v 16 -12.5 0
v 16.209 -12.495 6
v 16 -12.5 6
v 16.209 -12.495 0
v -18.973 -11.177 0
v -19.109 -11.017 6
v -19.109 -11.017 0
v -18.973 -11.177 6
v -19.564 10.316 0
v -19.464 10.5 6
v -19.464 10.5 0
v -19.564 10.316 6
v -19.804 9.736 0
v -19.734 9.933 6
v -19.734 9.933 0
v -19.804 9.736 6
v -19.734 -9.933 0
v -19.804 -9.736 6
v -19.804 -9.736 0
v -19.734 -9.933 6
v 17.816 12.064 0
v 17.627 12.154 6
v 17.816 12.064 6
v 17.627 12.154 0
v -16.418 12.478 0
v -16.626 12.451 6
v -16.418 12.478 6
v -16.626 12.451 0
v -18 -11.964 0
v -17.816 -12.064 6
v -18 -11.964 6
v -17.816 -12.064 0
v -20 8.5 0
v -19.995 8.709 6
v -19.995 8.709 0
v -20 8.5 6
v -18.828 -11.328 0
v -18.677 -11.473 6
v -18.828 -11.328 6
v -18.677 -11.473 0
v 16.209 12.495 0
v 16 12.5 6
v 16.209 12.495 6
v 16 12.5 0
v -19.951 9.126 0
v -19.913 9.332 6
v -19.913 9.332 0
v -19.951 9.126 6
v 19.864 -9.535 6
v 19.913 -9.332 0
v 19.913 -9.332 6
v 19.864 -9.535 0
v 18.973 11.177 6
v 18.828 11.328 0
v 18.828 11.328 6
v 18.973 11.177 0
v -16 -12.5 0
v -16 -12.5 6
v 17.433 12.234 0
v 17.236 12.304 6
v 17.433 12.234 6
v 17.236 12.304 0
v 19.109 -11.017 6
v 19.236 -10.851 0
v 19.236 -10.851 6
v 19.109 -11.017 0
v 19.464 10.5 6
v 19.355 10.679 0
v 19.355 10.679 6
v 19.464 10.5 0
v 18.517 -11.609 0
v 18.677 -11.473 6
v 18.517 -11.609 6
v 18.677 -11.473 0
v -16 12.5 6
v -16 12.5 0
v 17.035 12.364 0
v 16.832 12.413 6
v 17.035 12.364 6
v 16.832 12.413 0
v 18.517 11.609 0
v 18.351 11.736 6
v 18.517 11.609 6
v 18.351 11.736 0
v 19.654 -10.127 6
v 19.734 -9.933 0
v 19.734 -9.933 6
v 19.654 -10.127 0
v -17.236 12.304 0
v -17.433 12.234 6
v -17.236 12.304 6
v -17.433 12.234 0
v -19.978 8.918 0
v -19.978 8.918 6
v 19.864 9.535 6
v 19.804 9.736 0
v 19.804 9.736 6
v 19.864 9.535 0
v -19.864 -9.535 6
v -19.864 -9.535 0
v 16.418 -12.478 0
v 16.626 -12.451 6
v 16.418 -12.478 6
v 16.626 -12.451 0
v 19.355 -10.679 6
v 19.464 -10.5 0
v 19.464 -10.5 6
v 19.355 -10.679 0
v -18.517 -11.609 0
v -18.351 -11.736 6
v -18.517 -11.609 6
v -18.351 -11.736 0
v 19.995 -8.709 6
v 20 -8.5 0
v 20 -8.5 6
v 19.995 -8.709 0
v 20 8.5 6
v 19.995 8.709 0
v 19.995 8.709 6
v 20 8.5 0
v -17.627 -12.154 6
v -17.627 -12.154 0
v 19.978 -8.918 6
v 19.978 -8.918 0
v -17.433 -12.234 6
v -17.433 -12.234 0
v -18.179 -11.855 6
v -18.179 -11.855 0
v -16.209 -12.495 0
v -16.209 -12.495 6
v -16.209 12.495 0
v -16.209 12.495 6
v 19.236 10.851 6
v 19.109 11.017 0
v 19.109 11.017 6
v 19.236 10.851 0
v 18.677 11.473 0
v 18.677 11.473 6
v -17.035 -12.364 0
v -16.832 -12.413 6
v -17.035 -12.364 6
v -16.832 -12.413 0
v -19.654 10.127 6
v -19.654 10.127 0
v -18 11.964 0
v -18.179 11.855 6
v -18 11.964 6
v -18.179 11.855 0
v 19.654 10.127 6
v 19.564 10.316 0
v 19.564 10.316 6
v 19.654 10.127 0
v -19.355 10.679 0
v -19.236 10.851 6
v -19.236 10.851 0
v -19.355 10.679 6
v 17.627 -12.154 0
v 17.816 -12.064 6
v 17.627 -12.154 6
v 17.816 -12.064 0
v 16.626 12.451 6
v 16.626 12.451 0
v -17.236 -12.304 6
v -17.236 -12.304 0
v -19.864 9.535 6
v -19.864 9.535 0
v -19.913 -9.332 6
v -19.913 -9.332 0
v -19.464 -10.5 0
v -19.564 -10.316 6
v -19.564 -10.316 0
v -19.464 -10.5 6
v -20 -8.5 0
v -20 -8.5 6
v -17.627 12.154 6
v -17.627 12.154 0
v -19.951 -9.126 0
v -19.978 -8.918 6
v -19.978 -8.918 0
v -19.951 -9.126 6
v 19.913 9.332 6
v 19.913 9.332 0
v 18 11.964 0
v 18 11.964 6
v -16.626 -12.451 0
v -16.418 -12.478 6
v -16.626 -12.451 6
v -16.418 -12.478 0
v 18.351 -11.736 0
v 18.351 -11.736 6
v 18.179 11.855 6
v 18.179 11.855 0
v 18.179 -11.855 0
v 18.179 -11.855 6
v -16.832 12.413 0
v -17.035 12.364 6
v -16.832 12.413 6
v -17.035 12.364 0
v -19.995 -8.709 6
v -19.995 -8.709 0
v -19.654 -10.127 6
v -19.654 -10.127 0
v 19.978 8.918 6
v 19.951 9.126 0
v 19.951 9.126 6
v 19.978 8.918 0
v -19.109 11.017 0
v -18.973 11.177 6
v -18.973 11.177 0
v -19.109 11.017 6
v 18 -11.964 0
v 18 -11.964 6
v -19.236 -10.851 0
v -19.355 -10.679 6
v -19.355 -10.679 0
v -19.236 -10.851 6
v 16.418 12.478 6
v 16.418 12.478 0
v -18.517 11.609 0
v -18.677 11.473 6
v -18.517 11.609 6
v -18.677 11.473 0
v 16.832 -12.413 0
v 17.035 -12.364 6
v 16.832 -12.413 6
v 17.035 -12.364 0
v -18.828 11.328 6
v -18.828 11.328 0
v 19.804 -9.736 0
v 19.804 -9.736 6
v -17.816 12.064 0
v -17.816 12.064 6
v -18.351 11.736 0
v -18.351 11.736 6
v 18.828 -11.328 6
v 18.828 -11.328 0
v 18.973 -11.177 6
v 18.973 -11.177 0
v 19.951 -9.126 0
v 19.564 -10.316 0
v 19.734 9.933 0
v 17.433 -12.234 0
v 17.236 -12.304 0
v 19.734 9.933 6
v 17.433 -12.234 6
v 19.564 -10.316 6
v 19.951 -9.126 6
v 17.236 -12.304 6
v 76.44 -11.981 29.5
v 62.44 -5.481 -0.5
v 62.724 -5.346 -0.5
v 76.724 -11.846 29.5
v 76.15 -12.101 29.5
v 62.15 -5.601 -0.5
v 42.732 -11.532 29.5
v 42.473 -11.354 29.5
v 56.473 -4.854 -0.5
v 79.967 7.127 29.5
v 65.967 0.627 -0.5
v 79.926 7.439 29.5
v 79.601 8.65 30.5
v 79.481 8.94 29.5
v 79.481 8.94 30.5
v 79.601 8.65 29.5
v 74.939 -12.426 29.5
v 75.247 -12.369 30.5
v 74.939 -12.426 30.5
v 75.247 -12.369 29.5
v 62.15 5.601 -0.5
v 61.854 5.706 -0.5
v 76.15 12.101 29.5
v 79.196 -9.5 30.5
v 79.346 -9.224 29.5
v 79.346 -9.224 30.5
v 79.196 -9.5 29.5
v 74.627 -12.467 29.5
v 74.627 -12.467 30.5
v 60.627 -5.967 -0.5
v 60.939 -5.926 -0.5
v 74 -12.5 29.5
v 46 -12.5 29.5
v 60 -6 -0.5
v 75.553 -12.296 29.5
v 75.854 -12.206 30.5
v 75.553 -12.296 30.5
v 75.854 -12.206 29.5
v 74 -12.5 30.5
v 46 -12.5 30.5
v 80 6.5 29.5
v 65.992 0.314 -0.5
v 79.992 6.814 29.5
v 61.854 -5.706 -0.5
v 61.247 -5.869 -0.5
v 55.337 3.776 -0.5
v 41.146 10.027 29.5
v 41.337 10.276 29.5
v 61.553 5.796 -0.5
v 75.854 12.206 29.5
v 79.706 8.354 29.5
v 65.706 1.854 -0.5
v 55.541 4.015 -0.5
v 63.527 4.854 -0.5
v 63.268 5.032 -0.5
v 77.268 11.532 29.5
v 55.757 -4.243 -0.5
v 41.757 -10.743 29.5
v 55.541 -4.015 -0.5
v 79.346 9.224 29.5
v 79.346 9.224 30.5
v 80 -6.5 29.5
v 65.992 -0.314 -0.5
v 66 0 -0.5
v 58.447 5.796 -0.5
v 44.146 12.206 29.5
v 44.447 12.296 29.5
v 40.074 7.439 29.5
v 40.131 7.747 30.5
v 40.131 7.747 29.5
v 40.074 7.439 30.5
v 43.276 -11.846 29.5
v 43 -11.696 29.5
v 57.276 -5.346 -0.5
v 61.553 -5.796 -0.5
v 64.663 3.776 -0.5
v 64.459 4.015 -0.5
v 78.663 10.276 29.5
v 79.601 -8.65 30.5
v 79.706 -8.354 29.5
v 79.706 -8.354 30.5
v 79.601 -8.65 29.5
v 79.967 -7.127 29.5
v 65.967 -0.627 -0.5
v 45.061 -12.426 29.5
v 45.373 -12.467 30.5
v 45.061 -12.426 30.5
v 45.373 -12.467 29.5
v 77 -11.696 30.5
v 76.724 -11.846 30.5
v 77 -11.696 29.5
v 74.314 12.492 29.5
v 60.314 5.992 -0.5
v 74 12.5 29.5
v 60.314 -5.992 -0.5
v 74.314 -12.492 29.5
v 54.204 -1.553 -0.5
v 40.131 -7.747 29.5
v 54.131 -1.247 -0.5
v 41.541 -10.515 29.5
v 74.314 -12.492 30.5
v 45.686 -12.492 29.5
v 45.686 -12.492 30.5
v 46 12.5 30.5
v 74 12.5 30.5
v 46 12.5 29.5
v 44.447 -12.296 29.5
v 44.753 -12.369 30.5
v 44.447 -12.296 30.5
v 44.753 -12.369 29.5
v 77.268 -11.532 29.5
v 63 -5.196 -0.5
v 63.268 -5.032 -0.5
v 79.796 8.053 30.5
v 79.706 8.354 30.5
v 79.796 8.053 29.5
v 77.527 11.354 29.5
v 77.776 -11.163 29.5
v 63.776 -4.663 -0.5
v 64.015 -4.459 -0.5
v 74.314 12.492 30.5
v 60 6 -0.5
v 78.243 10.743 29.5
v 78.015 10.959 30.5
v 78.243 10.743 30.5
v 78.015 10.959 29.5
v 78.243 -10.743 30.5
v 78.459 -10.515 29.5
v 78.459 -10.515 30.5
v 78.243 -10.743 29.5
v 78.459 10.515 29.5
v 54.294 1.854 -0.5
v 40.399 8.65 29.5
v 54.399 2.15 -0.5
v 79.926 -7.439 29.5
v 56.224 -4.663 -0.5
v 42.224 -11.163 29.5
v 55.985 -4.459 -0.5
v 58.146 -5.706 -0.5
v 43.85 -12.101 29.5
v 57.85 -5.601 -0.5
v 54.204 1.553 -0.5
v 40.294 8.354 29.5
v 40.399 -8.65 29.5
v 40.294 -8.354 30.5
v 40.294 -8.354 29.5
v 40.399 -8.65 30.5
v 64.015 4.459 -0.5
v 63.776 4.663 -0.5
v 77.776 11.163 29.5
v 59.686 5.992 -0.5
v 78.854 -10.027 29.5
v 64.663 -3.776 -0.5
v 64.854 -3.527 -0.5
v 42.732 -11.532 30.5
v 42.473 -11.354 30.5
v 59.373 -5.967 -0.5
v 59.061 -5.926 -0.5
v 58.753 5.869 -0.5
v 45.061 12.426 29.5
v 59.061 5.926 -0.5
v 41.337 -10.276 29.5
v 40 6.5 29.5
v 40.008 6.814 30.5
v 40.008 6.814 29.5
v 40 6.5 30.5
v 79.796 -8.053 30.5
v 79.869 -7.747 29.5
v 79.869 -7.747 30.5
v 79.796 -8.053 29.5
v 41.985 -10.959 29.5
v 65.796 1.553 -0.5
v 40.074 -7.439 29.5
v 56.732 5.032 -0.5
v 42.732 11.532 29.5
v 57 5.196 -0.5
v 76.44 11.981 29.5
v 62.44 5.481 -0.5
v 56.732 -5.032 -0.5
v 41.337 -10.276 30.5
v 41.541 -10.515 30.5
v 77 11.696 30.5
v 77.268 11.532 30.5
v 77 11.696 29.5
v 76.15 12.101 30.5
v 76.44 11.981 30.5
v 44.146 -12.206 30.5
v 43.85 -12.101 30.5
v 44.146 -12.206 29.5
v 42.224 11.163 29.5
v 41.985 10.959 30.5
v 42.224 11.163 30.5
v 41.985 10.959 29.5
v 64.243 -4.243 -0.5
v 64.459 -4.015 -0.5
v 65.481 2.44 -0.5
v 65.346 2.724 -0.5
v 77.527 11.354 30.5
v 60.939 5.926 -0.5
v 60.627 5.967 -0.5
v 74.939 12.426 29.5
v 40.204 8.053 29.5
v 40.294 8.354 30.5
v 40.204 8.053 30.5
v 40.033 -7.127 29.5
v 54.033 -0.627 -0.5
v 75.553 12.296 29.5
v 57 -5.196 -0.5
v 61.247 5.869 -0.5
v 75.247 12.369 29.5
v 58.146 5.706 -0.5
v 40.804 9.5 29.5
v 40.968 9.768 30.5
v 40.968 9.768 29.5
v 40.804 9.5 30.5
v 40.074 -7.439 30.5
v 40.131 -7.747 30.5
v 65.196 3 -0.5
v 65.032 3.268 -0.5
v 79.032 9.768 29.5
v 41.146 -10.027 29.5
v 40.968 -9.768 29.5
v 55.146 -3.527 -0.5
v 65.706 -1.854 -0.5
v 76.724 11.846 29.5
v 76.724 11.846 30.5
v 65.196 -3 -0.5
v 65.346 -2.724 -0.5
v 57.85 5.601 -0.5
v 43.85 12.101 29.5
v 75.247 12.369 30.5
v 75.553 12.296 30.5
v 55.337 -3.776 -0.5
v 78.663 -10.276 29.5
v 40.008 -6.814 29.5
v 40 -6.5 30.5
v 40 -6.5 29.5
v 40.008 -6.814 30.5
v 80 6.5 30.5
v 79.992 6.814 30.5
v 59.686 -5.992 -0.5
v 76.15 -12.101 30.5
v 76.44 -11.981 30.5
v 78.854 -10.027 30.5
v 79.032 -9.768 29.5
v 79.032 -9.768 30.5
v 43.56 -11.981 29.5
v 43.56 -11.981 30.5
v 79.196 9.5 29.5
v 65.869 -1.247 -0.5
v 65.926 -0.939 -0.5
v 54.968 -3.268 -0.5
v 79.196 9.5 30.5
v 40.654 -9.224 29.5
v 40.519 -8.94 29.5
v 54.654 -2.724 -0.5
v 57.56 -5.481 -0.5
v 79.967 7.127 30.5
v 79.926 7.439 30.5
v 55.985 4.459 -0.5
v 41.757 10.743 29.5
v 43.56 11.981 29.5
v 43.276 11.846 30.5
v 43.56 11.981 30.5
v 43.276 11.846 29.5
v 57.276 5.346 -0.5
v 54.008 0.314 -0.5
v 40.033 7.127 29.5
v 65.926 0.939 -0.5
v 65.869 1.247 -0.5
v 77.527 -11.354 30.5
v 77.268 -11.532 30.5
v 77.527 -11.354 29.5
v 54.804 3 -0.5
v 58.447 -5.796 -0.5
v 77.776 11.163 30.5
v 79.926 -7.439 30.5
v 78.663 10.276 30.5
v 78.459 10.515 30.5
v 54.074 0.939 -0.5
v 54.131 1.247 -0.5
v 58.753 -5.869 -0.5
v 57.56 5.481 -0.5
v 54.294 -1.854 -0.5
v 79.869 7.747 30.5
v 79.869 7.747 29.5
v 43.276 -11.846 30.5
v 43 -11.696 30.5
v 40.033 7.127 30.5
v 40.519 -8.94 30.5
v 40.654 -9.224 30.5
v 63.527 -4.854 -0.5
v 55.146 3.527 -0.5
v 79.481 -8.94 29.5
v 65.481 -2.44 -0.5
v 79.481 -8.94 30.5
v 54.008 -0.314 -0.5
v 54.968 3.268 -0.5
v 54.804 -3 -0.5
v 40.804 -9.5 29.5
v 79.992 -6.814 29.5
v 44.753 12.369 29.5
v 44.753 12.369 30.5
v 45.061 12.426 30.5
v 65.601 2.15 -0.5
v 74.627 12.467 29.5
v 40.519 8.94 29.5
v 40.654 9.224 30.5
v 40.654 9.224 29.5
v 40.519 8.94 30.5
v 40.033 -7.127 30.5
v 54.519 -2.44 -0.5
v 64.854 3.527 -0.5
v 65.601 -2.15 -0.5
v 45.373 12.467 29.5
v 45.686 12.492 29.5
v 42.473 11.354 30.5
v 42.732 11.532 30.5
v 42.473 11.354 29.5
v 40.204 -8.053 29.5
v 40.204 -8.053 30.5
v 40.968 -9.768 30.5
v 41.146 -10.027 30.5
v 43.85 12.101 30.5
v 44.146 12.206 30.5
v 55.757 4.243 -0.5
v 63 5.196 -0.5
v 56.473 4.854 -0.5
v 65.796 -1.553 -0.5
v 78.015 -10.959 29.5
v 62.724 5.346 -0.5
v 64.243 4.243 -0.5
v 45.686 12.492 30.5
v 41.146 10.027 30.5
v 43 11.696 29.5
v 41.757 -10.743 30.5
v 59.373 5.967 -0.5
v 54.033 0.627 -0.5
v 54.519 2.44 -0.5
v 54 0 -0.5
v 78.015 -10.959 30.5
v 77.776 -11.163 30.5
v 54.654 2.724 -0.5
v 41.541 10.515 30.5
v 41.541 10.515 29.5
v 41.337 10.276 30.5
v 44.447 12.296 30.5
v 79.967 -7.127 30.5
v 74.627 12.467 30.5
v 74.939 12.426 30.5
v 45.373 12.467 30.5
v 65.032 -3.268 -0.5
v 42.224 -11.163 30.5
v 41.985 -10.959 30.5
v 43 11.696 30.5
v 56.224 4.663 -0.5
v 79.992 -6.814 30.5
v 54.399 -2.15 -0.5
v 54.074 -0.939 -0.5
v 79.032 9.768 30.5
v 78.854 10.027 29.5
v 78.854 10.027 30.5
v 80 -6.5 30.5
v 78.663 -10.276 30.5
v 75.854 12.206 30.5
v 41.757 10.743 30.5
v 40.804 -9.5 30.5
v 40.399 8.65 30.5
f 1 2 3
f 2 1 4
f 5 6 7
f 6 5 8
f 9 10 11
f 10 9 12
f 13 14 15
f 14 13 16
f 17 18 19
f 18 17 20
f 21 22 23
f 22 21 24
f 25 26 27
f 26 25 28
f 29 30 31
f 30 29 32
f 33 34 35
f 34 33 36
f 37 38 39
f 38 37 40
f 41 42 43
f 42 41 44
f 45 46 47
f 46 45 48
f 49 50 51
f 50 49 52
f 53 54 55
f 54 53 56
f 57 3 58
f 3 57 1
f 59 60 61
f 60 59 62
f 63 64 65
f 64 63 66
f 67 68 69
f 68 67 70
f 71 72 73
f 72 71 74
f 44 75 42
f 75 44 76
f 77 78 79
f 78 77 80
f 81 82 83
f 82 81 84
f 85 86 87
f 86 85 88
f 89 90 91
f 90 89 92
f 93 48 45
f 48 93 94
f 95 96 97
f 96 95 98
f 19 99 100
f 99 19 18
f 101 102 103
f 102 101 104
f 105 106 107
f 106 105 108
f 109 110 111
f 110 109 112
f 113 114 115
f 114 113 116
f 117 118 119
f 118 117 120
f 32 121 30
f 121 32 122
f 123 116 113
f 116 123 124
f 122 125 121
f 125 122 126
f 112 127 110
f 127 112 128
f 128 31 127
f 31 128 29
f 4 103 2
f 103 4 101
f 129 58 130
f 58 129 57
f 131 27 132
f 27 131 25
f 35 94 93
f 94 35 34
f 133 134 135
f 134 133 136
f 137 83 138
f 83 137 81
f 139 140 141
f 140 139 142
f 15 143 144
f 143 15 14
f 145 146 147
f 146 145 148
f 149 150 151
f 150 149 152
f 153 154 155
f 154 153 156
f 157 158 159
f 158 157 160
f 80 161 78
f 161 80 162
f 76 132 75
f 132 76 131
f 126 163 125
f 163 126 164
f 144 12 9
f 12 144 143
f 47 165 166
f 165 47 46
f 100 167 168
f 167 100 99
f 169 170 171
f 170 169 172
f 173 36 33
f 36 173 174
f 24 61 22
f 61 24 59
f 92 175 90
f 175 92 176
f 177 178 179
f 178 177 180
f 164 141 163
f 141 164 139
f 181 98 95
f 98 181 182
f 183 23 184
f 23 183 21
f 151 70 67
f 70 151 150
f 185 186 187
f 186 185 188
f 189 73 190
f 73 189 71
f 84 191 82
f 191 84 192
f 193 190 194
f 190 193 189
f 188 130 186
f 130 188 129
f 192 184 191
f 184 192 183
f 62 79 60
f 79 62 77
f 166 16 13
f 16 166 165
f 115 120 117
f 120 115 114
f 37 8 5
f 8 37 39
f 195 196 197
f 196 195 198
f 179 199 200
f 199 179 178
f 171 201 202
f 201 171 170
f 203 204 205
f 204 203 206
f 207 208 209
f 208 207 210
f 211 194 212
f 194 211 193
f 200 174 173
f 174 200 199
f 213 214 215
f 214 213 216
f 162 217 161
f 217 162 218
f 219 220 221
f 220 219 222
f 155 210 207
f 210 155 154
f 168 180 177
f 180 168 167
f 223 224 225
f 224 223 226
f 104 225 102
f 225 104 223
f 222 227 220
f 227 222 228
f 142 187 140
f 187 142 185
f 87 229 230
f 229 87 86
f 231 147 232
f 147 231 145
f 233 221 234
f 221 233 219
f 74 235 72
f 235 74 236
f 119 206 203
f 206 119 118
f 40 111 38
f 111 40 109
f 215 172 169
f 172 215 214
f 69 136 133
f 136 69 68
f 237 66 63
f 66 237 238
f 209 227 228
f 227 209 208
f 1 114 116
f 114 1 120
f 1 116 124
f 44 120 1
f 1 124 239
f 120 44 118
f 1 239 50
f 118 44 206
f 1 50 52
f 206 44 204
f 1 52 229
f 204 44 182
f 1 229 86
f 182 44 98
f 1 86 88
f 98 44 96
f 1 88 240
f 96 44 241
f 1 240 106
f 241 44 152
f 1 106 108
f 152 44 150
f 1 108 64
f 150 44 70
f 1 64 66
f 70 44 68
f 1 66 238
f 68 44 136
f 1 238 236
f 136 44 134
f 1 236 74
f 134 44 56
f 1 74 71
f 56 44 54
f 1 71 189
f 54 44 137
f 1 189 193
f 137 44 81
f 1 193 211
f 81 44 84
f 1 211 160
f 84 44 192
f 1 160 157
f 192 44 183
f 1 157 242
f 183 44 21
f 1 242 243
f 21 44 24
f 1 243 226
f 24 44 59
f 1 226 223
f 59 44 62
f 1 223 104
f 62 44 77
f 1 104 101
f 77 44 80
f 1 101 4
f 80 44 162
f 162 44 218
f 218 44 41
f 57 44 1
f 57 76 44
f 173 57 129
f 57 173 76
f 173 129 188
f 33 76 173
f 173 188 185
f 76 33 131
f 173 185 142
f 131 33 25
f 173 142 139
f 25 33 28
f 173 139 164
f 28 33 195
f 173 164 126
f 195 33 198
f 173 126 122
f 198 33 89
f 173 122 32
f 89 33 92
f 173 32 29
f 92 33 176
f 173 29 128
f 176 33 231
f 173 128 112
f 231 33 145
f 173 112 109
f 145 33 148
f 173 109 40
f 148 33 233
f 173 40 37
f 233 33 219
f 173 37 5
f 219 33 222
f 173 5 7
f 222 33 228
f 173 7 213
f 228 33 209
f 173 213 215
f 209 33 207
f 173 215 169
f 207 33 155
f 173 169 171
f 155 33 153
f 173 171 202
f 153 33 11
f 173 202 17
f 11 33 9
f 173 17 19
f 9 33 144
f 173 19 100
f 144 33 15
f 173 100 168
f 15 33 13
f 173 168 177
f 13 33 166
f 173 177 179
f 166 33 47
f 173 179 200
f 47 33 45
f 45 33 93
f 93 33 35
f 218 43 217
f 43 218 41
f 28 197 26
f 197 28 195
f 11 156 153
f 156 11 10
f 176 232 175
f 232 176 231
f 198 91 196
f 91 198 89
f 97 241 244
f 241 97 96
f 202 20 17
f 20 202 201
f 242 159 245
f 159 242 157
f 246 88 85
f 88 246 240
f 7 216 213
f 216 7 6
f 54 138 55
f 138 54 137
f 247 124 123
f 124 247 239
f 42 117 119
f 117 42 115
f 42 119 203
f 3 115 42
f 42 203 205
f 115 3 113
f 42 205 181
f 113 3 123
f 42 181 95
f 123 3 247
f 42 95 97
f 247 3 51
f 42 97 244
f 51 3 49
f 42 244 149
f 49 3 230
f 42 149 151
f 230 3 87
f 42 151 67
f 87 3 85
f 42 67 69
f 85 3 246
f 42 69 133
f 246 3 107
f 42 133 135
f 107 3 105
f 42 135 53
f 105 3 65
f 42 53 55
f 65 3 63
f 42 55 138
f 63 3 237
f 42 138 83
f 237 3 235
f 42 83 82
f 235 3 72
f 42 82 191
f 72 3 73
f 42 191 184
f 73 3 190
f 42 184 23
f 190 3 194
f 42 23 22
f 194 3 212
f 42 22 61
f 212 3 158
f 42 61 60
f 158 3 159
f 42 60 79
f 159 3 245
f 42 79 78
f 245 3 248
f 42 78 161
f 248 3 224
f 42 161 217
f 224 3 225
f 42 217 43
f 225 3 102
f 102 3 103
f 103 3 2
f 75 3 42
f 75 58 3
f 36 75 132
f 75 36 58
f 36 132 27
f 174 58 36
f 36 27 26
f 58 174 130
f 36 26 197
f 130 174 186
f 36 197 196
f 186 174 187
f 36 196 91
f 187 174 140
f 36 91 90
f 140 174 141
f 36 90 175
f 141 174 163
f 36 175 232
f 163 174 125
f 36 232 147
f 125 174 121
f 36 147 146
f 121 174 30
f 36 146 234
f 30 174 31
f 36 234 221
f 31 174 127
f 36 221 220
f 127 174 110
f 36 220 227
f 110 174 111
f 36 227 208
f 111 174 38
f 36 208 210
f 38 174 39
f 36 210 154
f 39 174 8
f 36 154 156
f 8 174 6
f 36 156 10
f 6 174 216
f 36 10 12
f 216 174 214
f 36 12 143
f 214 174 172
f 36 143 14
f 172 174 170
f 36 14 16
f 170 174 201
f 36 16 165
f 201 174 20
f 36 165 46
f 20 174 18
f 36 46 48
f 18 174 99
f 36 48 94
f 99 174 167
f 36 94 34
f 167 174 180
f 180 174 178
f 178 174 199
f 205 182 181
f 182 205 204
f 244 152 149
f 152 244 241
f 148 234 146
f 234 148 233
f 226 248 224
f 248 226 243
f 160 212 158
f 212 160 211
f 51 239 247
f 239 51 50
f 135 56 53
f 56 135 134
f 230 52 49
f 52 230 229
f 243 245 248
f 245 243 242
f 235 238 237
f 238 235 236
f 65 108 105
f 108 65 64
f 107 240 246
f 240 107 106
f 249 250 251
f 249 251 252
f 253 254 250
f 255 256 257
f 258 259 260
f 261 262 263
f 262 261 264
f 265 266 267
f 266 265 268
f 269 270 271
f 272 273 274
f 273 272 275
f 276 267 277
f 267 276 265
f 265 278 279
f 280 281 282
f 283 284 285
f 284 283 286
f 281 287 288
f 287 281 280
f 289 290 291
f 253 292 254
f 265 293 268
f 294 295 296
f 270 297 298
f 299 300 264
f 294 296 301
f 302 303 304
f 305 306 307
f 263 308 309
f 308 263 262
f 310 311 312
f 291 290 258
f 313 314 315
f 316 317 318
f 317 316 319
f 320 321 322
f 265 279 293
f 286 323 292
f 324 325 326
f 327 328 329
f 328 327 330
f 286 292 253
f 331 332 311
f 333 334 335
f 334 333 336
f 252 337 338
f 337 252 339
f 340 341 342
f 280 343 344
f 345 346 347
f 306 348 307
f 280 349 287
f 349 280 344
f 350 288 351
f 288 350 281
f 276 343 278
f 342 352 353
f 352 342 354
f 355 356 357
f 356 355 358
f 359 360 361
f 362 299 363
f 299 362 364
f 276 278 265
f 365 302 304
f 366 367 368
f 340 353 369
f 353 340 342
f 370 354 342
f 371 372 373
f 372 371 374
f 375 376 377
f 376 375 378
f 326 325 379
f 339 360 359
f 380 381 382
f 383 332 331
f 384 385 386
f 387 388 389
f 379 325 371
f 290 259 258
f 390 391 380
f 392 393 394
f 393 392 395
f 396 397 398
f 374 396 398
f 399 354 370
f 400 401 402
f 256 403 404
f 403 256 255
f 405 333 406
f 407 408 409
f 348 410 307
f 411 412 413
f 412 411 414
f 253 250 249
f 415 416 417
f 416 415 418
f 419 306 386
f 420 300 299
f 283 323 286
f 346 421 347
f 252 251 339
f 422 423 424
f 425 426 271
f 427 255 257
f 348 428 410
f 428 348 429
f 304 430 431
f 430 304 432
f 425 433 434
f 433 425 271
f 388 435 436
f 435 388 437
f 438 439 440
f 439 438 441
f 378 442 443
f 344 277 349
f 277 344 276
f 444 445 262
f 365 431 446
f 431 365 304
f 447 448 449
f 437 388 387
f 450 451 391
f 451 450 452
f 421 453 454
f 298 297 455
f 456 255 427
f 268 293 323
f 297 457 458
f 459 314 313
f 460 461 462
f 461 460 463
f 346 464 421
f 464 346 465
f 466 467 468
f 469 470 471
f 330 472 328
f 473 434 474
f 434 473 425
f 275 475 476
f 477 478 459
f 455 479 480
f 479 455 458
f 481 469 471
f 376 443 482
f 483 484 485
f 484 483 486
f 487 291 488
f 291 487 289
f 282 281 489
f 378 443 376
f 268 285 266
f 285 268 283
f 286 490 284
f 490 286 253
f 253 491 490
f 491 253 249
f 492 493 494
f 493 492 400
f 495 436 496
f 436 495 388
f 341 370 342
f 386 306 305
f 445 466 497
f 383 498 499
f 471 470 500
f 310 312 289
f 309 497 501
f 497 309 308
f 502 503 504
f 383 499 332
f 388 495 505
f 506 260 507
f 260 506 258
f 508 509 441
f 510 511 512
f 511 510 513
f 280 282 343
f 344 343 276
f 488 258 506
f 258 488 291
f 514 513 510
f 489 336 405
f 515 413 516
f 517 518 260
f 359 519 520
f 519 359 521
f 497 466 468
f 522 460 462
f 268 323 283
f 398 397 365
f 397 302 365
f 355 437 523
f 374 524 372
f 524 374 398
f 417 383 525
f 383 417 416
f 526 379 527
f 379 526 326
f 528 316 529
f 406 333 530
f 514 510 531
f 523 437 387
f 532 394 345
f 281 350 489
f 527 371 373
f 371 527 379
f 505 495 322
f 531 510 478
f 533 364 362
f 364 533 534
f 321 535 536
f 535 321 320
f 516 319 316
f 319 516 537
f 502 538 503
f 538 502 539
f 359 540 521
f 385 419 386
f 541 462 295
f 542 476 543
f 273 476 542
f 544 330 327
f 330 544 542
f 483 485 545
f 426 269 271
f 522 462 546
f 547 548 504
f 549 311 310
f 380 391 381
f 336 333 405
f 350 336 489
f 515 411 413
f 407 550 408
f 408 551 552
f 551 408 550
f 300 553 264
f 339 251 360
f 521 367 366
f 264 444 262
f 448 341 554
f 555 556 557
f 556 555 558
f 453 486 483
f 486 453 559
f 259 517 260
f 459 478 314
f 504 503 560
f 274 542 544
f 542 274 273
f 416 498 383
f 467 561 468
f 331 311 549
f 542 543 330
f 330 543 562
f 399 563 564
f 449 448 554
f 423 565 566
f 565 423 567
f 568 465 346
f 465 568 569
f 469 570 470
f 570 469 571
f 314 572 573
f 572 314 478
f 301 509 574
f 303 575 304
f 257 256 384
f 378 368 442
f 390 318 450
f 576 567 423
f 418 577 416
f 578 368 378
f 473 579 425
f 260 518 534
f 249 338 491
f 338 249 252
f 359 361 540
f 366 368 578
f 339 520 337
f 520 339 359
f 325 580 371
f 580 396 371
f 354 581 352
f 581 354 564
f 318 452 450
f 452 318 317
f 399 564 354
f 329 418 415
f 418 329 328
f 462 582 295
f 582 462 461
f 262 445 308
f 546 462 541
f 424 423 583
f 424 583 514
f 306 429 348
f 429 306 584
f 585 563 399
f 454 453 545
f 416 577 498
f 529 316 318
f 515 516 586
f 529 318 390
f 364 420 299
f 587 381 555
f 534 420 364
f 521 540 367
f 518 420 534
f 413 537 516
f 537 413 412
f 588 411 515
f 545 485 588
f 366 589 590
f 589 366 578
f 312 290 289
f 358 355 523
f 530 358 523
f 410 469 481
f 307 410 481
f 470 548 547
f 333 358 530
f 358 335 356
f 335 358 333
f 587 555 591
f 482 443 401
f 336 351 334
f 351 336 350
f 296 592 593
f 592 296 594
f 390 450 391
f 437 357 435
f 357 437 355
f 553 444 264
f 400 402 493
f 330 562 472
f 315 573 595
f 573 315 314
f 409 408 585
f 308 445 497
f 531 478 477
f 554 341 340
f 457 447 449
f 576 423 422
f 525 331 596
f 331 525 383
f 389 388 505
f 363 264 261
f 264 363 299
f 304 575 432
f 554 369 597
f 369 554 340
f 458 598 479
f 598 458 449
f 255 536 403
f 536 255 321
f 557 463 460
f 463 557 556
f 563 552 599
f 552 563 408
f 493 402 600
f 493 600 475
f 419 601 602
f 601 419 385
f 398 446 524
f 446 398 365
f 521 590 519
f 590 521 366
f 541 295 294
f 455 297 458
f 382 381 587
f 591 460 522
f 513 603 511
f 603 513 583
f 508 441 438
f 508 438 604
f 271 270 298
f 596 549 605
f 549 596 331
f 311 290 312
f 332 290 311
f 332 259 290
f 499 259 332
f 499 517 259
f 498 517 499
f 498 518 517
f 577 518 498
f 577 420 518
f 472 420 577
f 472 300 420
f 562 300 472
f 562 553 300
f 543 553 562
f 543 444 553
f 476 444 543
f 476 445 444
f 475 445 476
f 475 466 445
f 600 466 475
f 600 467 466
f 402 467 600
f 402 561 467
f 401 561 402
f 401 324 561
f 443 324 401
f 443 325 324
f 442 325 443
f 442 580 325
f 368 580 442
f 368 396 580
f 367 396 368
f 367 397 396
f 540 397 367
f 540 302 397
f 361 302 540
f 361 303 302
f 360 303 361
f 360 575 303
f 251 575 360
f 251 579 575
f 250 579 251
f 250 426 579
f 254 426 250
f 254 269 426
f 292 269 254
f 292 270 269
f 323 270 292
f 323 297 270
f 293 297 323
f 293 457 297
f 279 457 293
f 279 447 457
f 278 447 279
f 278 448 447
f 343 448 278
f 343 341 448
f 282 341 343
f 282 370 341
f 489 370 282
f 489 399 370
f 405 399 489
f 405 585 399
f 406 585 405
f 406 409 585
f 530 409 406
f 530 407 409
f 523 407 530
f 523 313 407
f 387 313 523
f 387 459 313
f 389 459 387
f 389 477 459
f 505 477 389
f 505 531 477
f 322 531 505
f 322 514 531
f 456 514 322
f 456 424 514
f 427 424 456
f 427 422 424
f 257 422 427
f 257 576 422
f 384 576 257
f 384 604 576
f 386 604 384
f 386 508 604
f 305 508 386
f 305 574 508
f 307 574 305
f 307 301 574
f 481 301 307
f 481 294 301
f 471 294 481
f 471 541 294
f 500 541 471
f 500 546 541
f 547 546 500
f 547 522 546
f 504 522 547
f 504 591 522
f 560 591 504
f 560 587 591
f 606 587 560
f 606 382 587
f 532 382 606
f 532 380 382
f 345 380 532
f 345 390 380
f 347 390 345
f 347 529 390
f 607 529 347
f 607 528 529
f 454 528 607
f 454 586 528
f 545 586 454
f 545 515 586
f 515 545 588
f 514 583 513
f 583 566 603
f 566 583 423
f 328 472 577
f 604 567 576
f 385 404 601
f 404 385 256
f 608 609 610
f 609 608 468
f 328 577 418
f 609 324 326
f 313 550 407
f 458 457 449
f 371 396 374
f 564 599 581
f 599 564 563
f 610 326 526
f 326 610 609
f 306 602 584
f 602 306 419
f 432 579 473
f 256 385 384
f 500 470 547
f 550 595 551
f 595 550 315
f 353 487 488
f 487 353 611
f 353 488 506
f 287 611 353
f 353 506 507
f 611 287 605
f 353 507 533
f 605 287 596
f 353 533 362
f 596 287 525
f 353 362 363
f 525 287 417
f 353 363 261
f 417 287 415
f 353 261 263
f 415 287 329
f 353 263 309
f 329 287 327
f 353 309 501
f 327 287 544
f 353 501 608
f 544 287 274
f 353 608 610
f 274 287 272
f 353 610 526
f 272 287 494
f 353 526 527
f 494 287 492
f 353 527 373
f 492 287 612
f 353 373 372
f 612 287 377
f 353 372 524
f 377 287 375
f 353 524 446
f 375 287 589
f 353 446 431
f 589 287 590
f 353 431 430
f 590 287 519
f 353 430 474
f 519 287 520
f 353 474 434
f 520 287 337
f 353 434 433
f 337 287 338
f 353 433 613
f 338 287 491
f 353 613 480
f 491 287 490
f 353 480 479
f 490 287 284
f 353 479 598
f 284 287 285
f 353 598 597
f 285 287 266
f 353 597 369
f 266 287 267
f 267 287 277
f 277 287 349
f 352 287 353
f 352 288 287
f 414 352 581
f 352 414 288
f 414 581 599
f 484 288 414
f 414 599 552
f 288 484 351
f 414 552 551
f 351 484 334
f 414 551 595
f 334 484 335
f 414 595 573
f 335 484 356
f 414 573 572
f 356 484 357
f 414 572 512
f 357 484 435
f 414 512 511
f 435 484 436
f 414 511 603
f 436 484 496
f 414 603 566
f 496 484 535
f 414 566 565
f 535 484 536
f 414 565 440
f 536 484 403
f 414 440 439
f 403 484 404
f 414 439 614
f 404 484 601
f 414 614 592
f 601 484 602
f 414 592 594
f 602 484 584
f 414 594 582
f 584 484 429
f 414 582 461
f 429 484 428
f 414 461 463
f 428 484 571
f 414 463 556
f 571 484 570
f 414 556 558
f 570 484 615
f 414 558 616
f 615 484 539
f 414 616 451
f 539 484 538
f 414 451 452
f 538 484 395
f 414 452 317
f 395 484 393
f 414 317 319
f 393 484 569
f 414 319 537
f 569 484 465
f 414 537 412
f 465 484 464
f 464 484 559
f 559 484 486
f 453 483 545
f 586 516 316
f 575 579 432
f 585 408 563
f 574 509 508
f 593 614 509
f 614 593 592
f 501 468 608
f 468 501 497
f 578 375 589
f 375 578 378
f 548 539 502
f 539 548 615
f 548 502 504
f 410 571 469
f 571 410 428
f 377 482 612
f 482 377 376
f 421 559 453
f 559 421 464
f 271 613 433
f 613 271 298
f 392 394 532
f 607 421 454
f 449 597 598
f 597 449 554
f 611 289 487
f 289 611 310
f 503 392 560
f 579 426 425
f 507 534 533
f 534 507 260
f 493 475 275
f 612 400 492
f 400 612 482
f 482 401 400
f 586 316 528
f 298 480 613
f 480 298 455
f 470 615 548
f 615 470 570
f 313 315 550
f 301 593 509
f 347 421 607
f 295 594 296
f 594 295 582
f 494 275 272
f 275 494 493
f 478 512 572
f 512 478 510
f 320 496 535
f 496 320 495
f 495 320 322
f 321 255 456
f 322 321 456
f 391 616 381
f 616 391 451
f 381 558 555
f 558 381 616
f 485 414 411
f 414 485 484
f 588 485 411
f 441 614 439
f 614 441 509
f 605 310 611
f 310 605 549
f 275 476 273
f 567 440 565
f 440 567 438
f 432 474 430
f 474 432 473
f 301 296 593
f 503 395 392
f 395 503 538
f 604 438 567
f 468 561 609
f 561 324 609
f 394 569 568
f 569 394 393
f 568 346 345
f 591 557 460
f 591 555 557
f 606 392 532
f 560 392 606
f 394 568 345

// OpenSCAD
// Shared geometry helpers.
// GPL-3.0-or-later and CERN-OHL-S-2.0; see LICENSING.md
// Units: mm

// These names are deliberately unprefixed because this project carries no
// library that defines them. A local module silently shadows a library one of
// the same name with no warning at all, so check for collisions before adding
// BOSL2, NopSCADlib or anything else global to this repo.

// This file never sets $fn: it is the consumer's to choose, and it crosses a
// `use <>` boundary as a special variable.

/**
 * Largest corner radius a rounded_square of this size can actually take.
 * offset() silently produces degenerate geometry once the radius exceeds half
 * the short side, so the request is clamped rather than left to misbehave.
 */
function fitted_radius(x, y, radius) = min(radius, min(x, y) / 2 - 0.01);

// Rectangle of x by y centred on the origin, corners rounded to `radius`.
module rounded_square(x, y, radius = 0) {
  assert(x > 0 && y > 0, str("rounded_square: x and y must be > 0, got: ", [x, y]));
  assert(radius >= 0, str("rounded_square: radius must be >= 0, got: ", radius));

  _radius = fitted_radius(x, y, radius);

  if (_radius <= 0) {
    square([x, y], center=true);
  } else {
    // offset out then in leaves the outer corners rounded and the size intact.
    offset(r=_radius) offset(delta=-_radius) square([x, y], center=true);
  }
}

// Extrusion of rounded_square, sitting on z = 0.
module rounded_box(x, y, z, radius = 0) {
  assert(z > 0, str("rounded_box: z must be > 0, got: ", z));

  linear_extrude(height=z) rounded_square(x, y, radius);
}

/**
 * Loft between two 2D sections, the first at z0 and the second at z1.
 *
 * Each section is extruded into a thin slab centred on its z and the two are
 * hulled. The slab has thickness so that adjoining lofts overlap and weld into
 * one solid instead of meeting on a coincident face, which CGAL will not always
 * resolve. Because the hull is taken between the slab EDGES, the resulting
 * taper runs from the bottom of the lower slab to the bottom of the upper one,
 * so z1 - z0 is the true rise of the sloped face.
 *
 * The two slabs are sized independently because a section that is already
 * buried inside an adjoining solid can be given extra thickness to guarantee
 * the weld without disturbing the exposed profile.
 */
module loft(z0, z1, slab0 = 1, slab1 = 1) {
  assert(z1 > z0, str("loft: z1 must be > z0, got: ", [z0, z1]));
  assert(slab0 > 0 && slab1 > 0, str("loft: slabs must be > 0, got: ", [slab0, slab1]));

  hull() {
    translate([0, 0, z0 - slab0 / 2]) linear_extrude(height=slab0) children(0);
    translate([0, 0, z1 - slab1 / 2]) linear_extrude(height=slab1) children(1);
  }
}

// Standalone preview. $fn is passed on the call, never assigned at top level --
// see dev/design-log.md. `use <>` does not run this; `include <>` would.
rounded_box(40, 25, 6, 4, $fn=$preview ? 48 : 120);
translate([60, 0, 0]) loft(0, 30, $fn=$preview ? 48 : 120) {
    circle(d=12);
    rounded_square(40, 25, 6);
  }
